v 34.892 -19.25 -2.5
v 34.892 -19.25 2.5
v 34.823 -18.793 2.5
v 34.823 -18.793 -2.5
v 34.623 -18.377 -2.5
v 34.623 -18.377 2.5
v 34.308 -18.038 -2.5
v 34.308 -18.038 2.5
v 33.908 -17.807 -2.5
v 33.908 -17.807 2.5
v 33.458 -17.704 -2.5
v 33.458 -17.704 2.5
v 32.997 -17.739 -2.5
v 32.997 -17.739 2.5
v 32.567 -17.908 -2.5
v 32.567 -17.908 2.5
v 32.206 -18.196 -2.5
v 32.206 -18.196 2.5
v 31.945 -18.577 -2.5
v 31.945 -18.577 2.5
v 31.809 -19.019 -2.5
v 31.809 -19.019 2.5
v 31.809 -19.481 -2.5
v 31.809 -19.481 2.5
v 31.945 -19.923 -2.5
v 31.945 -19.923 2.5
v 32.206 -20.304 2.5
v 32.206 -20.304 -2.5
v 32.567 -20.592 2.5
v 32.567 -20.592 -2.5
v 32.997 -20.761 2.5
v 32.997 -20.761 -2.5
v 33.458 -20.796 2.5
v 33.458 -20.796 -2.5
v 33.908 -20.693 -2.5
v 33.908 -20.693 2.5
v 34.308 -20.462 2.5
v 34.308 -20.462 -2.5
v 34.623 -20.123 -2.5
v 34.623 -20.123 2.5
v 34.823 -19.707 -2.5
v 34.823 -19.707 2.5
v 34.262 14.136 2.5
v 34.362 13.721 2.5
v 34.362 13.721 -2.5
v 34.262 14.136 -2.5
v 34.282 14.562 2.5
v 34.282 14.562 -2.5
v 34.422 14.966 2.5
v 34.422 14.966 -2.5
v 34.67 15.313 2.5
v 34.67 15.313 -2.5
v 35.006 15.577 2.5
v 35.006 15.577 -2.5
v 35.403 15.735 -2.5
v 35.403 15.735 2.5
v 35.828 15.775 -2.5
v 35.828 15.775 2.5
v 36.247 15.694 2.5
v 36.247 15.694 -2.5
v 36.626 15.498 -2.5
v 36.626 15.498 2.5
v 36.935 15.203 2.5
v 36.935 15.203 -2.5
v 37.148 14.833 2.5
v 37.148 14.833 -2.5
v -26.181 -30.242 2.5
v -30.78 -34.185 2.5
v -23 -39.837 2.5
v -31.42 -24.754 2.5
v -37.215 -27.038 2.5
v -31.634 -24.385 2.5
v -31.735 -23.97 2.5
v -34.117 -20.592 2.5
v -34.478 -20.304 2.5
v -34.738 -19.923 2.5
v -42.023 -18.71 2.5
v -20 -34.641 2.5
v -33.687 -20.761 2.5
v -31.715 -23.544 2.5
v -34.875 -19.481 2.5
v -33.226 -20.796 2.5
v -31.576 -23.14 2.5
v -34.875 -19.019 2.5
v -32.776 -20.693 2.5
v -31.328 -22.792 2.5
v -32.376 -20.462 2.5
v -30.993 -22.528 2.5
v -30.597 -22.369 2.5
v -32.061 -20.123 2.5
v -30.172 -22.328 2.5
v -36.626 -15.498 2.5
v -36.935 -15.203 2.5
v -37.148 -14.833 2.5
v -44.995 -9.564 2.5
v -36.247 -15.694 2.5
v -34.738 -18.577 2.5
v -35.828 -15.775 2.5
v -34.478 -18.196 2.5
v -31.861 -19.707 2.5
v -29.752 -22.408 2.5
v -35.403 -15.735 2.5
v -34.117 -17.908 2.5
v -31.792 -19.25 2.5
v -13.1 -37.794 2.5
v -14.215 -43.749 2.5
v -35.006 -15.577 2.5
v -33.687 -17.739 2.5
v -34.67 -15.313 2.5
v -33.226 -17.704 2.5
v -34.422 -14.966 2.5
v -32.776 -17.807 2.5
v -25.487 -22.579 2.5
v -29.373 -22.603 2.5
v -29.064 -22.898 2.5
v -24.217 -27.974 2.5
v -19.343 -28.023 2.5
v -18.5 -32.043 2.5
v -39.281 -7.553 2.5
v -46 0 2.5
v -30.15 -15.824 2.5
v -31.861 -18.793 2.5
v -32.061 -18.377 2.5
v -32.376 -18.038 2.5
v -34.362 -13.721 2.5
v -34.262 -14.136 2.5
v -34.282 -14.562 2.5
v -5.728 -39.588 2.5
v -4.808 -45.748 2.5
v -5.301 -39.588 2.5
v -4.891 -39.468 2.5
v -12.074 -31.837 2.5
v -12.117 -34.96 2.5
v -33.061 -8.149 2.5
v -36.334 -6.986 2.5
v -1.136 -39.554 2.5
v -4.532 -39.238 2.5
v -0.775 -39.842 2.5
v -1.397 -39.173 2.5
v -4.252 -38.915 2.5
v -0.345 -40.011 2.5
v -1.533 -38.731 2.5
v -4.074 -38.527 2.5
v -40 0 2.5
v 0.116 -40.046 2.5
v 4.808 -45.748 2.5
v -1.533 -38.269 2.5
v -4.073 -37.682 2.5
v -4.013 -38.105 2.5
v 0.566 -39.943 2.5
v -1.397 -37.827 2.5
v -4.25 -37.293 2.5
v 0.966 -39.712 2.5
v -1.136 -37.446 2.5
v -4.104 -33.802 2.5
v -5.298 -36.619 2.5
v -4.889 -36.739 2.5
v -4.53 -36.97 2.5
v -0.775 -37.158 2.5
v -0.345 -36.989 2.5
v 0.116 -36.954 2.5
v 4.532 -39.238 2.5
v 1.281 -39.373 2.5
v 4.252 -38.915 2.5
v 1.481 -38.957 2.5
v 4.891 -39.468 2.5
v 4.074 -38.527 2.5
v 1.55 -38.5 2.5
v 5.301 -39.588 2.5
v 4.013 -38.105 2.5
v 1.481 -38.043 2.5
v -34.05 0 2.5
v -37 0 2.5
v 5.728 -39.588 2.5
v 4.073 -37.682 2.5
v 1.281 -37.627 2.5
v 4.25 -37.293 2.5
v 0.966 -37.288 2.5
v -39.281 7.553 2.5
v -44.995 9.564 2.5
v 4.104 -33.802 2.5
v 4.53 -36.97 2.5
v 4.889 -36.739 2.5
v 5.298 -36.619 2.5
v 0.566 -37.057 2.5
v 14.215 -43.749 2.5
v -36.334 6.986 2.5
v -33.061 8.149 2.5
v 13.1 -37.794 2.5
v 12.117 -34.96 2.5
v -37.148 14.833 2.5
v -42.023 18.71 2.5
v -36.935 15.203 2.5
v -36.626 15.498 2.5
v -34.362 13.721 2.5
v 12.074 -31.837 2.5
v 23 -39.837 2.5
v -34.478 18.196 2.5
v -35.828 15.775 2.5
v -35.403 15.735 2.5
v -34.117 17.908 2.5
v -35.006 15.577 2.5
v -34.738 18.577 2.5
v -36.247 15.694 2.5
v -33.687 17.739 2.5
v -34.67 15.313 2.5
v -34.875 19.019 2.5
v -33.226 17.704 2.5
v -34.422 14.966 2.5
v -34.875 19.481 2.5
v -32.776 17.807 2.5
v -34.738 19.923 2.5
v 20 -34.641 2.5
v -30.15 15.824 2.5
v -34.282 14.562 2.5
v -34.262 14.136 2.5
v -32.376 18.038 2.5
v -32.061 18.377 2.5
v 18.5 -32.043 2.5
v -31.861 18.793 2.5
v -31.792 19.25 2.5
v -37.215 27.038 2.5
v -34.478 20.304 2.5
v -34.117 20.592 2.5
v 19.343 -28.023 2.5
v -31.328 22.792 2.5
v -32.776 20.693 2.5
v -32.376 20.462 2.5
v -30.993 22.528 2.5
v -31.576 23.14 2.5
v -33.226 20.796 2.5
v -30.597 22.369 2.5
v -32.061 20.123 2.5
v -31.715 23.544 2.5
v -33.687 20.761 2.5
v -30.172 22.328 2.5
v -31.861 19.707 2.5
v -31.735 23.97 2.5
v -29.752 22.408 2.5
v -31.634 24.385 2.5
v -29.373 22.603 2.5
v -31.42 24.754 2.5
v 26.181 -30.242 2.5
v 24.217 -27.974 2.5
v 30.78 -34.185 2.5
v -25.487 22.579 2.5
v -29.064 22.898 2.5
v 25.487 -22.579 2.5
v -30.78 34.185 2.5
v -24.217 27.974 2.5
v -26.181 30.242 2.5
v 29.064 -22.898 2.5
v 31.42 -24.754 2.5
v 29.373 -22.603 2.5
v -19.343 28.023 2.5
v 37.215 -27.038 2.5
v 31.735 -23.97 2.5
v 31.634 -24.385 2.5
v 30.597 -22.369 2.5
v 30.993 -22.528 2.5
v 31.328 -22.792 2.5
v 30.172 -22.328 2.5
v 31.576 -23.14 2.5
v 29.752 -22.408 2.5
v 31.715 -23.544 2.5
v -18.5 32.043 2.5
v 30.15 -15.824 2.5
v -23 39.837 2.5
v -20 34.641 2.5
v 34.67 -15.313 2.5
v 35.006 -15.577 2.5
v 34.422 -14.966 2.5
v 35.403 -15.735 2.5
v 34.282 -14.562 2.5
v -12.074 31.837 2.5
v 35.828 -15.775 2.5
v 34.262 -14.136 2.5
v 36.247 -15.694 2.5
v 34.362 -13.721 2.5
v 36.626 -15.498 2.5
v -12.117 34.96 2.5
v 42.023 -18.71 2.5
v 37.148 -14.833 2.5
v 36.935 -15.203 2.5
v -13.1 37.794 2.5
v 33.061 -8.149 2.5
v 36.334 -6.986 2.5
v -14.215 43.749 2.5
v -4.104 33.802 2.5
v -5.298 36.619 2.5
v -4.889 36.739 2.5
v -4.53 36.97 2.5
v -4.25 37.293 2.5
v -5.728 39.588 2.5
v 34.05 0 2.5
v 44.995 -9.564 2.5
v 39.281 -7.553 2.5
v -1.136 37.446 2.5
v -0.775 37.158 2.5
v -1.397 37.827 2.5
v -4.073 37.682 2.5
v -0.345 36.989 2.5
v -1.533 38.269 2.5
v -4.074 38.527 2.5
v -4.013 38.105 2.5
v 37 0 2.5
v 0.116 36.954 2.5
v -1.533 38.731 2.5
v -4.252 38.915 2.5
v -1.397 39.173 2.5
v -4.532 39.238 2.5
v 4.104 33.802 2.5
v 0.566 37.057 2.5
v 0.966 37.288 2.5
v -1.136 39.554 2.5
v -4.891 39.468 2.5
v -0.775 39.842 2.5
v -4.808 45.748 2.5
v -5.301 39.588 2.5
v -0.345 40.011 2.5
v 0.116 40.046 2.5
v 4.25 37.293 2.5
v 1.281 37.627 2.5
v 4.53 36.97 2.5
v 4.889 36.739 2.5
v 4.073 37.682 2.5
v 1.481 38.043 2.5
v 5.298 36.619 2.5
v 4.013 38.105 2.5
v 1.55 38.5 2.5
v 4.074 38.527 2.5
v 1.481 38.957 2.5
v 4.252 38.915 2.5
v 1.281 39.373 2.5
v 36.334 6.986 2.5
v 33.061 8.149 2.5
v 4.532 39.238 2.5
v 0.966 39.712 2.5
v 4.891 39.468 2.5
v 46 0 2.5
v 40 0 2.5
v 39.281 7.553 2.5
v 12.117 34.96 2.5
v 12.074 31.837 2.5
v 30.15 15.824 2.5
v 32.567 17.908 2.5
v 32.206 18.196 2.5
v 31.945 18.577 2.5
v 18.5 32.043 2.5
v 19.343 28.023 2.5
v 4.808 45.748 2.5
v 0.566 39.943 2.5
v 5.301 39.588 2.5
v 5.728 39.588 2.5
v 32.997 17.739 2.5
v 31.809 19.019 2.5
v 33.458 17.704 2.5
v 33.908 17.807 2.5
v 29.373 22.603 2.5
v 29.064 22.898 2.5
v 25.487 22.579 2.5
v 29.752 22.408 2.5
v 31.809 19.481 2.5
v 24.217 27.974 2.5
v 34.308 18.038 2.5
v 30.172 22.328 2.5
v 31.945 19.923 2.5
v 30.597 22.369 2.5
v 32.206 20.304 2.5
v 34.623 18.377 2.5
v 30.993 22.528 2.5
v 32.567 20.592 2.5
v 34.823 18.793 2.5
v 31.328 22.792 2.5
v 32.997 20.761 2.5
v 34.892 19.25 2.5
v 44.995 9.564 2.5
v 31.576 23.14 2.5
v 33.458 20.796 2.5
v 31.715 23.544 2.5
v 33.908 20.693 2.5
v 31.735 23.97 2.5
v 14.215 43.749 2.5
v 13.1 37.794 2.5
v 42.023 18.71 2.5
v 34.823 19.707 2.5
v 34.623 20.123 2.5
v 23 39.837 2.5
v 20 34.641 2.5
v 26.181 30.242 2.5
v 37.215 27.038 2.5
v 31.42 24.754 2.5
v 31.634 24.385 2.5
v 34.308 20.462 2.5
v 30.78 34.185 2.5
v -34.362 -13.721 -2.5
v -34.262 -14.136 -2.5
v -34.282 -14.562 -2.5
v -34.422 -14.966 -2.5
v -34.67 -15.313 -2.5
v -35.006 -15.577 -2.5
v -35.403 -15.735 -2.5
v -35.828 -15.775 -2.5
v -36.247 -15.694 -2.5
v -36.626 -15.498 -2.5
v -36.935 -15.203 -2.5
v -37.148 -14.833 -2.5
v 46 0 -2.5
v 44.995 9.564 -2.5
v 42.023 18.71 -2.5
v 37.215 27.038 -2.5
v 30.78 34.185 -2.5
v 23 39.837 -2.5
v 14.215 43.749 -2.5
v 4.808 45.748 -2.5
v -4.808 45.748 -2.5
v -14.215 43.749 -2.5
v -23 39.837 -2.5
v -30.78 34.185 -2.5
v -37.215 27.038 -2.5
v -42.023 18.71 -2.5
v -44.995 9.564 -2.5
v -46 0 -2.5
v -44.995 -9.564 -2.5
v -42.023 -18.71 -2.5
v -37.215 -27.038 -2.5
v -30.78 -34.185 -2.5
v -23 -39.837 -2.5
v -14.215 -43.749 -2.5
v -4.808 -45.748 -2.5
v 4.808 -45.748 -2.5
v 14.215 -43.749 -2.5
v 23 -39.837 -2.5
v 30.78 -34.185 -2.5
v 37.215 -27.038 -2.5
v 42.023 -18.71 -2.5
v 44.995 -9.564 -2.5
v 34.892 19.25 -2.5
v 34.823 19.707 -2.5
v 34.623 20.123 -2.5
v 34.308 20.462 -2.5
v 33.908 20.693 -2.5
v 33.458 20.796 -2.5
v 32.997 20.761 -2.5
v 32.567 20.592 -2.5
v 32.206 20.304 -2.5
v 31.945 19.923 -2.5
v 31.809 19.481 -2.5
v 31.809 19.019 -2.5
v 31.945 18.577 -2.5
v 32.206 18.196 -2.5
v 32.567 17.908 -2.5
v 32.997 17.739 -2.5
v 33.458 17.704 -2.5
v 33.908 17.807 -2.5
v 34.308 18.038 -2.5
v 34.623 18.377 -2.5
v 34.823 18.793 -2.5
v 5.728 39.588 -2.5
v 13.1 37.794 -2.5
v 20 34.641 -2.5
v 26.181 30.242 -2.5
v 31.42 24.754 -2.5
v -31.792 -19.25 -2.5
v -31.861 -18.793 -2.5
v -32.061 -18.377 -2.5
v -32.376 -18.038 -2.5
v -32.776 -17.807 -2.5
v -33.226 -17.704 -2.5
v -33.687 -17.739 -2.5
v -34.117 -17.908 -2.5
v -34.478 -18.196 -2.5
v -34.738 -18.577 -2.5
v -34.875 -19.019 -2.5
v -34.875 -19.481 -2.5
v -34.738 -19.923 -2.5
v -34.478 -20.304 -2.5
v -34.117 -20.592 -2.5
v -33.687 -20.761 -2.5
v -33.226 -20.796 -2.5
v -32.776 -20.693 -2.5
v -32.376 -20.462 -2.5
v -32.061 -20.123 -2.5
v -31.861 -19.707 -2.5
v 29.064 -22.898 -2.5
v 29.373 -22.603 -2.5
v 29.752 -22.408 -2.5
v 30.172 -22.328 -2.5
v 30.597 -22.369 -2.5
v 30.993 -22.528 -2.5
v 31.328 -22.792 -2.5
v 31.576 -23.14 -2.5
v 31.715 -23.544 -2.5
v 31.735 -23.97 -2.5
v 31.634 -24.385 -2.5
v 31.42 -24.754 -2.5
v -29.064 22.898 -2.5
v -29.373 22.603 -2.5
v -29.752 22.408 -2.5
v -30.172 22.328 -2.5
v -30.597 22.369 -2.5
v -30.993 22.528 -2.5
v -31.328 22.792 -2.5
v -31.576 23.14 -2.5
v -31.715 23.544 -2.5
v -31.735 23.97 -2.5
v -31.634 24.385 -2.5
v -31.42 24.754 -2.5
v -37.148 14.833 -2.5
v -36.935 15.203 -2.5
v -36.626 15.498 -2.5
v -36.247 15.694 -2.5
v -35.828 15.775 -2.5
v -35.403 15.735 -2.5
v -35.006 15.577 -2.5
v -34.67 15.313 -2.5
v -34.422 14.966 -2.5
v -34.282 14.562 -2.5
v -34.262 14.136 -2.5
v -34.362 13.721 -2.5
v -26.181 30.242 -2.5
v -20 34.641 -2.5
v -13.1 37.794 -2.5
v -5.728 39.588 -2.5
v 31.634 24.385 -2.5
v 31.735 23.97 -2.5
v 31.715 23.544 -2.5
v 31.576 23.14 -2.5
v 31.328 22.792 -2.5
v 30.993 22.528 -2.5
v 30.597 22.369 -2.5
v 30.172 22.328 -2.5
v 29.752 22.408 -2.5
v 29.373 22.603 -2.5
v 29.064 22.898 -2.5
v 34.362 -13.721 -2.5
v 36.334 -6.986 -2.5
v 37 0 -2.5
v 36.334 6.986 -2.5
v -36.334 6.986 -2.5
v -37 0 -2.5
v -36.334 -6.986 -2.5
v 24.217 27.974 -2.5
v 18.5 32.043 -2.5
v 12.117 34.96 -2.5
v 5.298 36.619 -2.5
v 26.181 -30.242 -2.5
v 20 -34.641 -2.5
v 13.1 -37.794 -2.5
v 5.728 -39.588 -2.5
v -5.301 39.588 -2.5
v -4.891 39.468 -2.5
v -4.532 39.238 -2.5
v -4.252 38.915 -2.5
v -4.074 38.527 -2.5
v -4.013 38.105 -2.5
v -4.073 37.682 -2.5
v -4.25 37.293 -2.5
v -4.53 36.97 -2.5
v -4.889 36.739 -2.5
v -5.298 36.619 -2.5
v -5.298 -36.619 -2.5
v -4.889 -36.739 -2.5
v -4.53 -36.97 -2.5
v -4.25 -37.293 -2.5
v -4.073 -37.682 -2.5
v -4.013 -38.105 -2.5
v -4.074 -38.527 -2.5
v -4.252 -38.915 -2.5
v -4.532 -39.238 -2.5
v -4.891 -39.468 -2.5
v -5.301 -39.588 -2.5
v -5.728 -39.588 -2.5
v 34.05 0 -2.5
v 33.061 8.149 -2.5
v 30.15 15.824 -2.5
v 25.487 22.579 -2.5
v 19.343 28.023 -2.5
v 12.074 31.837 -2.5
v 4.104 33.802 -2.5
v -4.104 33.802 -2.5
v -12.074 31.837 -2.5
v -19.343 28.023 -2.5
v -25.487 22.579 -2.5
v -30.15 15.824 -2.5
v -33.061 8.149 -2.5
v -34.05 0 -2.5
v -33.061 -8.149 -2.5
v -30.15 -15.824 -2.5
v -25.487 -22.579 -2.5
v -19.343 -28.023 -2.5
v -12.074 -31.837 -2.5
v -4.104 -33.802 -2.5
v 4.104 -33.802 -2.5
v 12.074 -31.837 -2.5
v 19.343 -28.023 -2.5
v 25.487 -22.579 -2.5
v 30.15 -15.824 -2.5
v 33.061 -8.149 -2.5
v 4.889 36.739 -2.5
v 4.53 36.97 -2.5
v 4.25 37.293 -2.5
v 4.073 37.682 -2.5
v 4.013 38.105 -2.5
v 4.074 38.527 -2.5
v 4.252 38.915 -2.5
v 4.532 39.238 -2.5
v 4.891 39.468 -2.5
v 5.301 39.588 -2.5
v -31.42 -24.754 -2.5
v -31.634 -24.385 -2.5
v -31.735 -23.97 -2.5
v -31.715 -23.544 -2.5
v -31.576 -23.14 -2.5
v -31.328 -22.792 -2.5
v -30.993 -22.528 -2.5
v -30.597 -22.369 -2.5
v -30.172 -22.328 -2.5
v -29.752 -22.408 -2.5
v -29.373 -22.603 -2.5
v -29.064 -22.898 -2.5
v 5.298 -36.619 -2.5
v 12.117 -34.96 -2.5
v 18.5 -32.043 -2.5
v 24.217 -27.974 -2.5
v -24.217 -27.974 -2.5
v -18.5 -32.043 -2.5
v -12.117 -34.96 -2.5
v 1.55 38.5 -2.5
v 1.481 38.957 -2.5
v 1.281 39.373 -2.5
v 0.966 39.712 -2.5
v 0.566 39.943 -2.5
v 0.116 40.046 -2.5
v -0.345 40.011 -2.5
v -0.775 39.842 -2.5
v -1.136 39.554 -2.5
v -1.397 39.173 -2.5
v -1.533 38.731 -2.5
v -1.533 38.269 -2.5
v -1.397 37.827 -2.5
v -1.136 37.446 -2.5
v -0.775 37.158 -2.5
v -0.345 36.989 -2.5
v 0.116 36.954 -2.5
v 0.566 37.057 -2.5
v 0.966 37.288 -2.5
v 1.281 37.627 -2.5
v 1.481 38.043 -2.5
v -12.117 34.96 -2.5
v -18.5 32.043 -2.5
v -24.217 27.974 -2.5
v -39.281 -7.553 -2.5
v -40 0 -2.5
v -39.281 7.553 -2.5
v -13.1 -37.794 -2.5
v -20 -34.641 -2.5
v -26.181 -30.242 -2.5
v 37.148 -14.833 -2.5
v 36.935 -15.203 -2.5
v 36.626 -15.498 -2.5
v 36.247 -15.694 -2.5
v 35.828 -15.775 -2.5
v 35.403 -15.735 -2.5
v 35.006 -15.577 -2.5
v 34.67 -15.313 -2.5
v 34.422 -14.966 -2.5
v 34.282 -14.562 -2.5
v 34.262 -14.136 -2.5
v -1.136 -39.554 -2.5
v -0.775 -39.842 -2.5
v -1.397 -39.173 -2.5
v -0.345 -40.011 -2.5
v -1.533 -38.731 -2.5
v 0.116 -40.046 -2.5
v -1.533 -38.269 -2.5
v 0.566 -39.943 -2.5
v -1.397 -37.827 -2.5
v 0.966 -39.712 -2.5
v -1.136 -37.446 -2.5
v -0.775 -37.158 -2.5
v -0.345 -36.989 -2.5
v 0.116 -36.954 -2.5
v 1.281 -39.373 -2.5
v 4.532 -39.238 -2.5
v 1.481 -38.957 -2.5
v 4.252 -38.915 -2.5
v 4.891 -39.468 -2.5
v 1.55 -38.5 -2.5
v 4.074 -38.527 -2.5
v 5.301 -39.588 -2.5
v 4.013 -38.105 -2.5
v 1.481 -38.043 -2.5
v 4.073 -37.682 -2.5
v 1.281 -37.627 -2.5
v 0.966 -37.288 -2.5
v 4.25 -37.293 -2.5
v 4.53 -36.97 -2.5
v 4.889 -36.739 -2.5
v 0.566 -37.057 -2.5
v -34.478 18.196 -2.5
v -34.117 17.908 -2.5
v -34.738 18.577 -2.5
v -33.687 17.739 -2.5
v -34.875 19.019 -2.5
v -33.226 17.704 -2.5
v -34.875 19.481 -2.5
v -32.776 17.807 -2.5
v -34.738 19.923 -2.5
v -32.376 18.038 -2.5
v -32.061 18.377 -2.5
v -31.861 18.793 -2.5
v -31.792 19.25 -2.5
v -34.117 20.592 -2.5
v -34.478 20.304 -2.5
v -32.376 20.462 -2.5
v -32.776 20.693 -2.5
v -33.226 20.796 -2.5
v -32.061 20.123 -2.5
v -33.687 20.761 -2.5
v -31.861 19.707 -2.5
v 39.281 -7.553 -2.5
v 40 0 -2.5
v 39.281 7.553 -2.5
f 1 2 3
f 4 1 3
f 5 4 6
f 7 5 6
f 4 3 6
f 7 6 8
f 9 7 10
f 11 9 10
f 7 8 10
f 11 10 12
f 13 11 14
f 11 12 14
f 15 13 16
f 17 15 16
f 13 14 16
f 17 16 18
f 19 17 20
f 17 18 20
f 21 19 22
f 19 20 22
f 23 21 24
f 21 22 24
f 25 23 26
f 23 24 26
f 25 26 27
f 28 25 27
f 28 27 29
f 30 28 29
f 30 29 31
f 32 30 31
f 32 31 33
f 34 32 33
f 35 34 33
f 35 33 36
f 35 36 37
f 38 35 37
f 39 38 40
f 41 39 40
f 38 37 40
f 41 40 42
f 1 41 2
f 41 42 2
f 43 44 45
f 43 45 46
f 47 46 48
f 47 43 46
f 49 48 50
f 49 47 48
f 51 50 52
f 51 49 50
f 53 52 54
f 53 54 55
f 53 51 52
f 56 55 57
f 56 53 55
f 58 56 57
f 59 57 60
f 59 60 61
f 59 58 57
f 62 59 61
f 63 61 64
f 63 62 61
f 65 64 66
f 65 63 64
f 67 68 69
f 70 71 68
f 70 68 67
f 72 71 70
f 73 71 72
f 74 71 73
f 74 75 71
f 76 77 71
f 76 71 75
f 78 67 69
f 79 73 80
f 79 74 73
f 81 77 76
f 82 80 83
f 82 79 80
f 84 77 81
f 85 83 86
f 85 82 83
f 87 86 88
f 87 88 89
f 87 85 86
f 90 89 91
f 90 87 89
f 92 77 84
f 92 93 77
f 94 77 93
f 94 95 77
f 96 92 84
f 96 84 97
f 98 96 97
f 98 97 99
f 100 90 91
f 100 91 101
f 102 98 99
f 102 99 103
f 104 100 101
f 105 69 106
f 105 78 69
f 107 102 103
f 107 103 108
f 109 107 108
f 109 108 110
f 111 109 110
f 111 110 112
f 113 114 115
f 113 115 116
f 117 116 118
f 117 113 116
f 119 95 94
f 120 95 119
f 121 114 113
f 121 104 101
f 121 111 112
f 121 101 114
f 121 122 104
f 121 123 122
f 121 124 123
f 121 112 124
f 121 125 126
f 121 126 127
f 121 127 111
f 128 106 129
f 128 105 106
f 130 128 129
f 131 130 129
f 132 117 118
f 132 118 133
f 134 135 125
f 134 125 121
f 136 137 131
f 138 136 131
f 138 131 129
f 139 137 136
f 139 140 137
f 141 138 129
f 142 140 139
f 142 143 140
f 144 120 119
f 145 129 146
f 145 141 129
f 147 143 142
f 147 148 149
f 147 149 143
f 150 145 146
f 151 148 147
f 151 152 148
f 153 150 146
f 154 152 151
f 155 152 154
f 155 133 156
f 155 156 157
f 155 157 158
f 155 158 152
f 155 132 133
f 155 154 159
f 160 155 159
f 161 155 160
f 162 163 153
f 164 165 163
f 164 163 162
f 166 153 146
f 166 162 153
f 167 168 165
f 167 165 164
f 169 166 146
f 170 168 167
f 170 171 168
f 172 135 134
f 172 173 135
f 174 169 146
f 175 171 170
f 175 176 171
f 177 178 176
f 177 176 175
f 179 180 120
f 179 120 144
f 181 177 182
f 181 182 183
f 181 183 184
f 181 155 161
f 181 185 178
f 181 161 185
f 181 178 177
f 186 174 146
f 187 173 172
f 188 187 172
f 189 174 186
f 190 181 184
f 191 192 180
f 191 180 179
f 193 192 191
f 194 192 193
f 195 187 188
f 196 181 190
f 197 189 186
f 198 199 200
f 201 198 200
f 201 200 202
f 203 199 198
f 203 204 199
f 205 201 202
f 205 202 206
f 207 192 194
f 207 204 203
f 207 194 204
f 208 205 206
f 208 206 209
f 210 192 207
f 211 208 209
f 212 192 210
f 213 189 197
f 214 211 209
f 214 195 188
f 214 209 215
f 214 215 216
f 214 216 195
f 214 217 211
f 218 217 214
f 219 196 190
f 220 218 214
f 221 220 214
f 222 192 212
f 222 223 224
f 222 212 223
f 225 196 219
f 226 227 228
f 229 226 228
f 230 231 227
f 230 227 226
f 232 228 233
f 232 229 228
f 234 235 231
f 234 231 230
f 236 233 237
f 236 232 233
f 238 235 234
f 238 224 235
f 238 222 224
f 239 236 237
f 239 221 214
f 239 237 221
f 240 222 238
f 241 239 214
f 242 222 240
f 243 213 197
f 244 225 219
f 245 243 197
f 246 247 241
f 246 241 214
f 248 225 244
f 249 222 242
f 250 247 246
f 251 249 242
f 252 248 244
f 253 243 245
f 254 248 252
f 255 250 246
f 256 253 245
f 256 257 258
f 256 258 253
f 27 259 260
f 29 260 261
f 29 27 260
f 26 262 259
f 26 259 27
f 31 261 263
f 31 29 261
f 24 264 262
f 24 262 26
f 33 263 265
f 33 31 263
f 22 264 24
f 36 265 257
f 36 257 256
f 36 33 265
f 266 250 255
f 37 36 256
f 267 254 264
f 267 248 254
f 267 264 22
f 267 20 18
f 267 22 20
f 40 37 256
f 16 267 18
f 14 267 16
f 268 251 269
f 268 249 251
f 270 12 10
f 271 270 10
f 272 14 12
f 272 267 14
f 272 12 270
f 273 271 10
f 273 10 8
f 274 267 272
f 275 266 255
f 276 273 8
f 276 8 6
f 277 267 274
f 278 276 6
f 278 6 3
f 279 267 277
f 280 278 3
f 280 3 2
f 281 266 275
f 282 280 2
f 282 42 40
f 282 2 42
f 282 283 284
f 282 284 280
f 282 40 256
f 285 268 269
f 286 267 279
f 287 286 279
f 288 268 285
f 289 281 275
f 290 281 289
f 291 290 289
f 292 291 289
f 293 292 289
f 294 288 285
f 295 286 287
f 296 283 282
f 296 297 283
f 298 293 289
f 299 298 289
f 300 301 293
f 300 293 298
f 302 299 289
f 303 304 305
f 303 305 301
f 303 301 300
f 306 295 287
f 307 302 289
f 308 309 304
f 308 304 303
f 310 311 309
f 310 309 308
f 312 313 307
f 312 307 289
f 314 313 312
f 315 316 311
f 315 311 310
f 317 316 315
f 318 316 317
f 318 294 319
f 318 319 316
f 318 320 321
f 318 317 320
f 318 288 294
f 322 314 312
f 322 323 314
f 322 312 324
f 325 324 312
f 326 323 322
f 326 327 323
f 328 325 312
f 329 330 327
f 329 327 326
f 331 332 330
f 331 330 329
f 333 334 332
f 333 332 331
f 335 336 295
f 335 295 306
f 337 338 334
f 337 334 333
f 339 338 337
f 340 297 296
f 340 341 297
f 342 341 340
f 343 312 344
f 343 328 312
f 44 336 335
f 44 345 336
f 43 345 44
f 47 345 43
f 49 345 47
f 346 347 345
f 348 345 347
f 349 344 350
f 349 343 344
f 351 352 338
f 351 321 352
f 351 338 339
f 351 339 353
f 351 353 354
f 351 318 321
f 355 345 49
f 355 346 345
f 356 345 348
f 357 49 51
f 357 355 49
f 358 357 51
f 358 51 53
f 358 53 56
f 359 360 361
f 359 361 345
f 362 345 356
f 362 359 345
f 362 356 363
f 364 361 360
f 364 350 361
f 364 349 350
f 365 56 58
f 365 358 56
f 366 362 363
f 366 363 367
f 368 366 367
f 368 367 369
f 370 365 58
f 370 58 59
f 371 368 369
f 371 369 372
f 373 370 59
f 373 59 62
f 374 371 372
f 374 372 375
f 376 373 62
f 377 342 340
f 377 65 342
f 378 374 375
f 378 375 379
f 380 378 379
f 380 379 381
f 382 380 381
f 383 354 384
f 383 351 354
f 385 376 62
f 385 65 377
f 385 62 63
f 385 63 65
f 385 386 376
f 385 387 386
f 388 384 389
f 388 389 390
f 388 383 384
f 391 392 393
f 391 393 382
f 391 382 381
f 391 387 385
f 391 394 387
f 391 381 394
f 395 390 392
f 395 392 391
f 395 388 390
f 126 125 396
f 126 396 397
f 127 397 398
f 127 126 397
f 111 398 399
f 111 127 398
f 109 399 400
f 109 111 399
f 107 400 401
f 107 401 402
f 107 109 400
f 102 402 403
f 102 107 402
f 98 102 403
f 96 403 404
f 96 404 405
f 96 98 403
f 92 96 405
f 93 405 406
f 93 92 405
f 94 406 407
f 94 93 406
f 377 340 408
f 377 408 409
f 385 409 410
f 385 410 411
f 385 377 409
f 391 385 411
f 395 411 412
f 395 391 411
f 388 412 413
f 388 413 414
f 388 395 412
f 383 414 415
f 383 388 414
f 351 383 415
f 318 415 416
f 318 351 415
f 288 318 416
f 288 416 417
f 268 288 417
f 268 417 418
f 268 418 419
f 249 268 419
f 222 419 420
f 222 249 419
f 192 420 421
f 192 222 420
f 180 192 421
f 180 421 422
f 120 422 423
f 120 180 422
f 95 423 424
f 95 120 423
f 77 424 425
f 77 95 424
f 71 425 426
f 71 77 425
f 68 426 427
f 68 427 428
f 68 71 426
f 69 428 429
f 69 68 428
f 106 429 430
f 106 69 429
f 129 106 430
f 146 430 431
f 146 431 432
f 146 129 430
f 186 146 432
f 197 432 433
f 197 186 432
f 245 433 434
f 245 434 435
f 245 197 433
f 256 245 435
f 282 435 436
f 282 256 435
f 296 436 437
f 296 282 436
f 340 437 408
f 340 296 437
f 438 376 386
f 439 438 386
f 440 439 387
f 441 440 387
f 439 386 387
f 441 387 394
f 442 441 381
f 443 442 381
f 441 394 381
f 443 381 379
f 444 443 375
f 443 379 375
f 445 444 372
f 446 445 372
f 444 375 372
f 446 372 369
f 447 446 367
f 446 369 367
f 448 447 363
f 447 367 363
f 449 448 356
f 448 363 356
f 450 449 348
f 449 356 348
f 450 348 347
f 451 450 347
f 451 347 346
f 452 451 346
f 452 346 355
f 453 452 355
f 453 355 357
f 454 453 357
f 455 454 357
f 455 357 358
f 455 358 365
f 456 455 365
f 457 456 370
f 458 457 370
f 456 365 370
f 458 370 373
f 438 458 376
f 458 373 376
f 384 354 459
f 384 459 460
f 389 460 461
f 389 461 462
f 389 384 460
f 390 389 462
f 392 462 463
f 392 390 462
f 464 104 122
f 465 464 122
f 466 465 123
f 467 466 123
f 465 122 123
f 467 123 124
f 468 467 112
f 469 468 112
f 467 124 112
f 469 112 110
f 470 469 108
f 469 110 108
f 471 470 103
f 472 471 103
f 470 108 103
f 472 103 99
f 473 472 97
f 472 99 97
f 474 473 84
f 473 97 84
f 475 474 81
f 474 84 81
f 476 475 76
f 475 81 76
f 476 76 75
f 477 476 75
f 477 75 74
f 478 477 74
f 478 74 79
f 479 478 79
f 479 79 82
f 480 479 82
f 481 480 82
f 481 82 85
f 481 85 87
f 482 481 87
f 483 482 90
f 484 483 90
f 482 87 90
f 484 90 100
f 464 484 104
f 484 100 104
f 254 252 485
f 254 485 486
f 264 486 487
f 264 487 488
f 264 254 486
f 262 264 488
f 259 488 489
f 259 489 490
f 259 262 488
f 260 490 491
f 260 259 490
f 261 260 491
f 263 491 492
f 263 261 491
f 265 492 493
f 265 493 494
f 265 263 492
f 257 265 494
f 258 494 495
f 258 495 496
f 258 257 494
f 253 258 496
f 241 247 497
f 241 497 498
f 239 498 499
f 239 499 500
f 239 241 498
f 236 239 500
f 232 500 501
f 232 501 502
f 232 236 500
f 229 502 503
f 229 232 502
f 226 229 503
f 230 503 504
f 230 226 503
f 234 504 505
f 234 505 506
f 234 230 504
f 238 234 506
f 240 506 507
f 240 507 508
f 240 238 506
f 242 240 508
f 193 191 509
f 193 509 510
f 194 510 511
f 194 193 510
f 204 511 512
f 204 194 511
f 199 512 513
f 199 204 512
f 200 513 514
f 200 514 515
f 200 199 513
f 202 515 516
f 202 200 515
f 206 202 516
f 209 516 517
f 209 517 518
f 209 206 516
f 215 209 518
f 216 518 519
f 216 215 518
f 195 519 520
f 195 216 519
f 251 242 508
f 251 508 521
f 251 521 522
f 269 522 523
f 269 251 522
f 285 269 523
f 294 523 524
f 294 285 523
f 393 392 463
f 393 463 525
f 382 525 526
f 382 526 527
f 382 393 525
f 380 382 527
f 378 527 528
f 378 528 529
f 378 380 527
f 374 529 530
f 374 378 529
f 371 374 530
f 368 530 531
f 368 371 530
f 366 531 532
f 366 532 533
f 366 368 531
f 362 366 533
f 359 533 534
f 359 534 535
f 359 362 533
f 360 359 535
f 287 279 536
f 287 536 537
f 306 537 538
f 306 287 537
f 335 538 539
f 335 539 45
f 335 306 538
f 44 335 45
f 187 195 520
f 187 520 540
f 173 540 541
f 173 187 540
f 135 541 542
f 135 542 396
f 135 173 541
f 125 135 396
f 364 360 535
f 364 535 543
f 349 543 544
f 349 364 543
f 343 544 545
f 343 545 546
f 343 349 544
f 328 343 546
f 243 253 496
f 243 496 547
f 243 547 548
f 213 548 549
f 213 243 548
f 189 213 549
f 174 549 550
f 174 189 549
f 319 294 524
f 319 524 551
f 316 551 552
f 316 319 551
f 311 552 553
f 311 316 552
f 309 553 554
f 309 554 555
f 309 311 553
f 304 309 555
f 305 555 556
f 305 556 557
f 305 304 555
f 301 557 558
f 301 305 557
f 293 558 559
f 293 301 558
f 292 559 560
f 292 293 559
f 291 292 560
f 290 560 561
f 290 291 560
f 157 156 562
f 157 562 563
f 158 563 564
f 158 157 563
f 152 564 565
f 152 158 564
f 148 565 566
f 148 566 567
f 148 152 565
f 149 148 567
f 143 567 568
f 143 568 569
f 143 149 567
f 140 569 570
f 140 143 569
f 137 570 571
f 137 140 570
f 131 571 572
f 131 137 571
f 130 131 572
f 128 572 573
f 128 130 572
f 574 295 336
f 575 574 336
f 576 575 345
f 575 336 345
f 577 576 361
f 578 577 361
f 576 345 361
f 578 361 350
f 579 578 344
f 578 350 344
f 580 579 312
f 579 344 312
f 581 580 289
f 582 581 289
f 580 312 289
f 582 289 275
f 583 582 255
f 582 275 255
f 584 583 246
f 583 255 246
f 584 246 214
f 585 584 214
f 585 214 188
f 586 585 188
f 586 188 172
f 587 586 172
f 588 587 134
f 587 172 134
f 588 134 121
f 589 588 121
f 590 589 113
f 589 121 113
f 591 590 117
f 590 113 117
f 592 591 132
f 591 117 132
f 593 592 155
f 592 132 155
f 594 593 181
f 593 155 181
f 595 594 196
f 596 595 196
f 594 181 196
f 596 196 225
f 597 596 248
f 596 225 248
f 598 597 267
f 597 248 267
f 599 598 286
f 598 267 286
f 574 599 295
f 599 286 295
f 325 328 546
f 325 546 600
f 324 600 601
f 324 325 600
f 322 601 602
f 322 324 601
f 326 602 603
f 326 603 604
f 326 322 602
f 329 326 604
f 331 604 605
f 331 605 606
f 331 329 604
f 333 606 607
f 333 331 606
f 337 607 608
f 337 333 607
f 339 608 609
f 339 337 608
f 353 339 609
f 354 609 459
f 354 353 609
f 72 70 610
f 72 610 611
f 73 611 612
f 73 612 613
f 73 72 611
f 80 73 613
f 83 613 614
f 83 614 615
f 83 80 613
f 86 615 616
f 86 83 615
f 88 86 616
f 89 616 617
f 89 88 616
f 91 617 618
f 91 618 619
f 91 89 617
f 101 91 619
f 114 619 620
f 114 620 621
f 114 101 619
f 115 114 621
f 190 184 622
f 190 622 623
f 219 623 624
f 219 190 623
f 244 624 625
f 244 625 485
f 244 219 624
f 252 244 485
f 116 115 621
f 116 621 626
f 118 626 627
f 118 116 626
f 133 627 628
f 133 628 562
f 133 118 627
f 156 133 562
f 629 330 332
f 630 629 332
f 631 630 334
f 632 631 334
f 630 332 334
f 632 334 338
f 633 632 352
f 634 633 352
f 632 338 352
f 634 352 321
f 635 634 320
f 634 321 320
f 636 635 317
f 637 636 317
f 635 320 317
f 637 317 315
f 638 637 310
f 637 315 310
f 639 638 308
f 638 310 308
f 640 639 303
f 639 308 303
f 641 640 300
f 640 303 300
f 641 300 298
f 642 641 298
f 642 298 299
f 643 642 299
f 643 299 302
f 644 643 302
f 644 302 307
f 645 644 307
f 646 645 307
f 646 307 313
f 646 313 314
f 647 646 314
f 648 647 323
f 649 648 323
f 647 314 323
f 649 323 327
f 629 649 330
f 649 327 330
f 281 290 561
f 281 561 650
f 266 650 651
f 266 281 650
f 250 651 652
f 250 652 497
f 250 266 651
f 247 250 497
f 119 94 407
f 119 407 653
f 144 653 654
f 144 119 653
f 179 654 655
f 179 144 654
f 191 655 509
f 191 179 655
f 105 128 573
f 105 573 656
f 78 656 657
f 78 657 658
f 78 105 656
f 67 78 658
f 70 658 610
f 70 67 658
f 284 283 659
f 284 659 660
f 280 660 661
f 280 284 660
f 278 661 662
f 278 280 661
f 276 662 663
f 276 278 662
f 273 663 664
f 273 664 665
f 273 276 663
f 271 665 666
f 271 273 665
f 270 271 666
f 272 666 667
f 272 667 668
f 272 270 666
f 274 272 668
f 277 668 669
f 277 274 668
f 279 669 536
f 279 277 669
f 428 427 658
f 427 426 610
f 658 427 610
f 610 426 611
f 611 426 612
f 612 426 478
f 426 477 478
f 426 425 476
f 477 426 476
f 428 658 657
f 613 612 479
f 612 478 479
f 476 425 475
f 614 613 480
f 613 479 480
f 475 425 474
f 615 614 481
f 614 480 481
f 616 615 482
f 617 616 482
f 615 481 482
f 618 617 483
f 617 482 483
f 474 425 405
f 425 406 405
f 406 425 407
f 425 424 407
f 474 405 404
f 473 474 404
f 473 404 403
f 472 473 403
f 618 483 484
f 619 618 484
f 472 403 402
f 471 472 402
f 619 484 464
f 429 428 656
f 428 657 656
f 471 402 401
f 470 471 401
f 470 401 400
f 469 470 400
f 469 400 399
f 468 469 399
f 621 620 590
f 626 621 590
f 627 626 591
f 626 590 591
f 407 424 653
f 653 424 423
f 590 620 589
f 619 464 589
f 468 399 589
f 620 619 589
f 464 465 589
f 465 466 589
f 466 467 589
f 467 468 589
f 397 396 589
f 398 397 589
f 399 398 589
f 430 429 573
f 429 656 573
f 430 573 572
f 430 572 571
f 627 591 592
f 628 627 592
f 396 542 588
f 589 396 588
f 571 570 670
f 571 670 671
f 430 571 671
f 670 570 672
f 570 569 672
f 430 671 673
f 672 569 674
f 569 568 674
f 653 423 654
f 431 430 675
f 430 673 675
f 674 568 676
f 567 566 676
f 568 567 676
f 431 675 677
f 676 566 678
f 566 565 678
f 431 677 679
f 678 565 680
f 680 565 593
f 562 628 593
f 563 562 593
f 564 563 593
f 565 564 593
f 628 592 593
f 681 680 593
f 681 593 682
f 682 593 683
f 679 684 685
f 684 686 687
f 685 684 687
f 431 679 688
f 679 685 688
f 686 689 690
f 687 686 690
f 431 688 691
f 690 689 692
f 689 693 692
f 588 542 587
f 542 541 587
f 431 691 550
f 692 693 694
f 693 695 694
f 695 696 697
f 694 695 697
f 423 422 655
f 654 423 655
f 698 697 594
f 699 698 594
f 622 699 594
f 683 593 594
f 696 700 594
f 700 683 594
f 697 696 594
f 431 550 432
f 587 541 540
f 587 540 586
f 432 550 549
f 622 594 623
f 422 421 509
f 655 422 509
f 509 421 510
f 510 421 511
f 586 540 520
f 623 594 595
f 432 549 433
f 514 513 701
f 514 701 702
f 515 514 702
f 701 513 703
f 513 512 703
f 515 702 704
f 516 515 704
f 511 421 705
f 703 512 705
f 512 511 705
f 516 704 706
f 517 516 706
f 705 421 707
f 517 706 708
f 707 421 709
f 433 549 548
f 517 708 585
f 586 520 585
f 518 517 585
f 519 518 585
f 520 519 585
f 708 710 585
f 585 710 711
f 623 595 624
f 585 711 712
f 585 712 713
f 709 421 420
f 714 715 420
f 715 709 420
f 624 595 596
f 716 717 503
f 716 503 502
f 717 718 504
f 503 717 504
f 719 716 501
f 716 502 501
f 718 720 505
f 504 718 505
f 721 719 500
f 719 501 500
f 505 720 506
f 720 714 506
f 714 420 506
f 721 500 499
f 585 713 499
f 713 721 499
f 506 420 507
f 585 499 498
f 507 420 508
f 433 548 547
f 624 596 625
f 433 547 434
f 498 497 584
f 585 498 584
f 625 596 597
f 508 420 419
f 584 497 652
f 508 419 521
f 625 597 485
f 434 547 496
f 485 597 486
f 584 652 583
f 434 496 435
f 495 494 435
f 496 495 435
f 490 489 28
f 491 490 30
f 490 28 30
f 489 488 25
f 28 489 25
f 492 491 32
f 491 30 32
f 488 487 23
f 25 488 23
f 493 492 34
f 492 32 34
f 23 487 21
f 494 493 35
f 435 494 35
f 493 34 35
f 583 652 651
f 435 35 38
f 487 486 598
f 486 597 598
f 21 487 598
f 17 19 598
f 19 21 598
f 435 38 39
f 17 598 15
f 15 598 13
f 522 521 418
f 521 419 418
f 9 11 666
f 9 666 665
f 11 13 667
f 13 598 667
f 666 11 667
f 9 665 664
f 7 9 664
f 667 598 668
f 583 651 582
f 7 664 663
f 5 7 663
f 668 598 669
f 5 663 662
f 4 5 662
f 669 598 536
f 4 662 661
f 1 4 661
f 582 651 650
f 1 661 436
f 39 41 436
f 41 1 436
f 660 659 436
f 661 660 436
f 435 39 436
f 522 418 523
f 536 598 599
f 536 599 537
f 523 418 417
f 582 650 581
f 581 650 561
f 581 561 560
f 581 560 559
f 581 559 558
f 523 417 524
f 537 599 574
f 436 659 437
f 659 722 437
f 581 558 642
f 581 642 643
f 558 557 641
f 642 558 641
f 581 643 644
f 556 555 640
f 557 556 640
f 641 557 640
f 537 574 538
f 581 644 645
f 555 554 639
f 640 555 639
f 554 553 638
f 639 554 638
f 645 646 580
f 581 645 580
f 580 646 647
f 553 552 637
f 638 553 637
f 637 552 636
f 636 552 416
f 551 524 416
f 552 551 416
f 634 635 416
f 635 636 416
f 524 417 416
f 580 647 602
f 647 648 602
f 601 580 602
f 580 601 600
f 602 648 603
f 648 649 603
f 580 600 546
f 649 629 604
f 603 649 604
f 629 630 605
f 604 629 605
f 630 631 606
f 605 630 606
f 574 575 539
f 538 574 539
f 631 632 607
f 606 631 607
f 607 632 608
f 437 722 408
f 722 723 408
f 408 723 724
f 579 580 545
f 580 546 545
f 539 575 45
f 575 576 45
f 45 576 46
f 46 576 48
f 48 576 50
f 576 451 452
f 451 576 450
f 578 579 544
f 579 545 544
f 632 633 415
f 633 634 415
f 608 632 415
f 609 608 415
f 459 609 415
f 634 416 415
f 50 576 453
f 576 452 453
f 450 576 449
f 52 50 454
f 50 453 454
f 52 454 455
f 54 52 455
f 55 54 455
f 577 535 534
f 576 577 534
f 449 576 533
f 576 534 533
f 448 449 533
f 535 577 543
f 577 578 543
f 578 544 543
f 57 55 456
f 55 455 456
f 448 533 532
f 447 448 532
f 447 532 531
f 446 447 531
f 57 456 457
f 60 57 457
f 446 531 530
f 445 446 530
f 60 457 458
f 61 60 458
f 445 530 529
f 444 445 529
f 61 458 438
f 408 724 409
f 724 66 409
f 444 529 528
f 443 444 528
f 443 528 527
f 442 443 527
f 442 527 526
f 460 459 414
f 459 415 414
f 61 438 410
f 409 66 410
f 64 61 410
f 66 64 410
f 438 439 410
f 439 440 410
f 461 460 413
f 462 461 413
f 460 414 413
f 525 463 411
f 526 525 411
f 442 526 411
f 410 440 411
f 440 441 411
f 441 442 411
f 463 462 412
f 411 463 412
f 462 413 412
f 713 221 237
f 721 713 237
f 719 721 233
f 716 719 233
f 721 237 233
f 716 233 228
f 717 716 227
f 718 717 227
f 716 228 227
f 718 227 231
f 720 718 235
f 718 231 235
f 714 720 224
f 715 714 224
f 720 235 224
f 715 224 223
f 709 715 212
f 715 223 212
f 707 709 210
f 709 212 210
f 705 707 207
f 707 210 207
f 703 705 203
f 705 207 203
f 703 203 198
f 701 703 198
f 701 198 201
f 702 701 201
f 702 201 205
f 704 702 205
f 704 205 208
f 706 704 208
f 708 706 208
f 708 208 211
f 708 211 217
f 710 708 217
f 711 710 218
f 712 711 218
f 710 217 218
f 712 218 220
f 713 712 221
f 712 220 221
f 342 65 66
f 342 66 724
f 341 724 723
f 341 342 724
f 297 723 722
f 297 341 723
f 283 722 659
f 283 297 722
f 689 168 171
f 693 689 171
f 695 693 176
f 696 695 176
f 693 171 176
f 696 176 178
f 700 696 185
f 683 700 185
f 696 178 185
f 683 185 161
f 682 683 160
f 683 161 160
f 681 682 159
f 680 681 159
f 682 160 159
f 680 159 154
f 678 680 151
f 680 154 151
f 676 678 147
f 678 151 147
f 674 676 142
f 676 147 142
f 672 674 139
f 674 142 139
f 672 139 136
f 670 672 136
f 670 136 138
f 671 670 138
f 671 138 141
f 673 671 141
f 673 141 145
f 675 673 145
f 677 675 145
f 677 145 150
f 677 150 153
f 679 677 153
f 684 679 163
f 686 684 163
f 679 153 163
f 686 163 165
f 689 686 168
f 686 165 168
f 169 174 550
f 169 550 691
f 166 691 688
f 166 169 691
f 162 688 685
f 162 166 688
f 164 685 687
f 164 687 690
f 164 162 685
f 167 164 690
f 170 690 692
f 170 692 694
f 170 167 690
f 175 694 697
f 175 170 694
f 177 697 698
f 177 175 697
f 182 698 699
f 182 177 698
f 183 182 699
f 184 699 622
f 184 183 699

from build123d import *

# Parameters (mm, degrees)
SKETCH_1_R      = 46
SKETCH_1_R_2    = 1.55
SKETCH_1_R_3    = 34.05
EXTRUDE_1_DEPTH = 5


with BuildPart() as part:
    # 草图1 → 凸台-拉伸1 (new body)
    with BuildSketch(Plane.XY.offset(2.5)):
        Circle(SKETCH_1_R)
        with Locations((33.341978046, 19.25)):
            Circle(SKETCH_1_R_2, mode=Mode.SUBTRACT)
        with Locations((33.341978046, -19.25)):
            Circle(SKETCH_1_R_2, mode=Mode.SUBTRACT)
        with Locations((0, -38.5)):
            Circle(SKETCH_1_R_2, mode=Mode.SUBTRACT)
        with Locations((-33.341978046, -19.25)):
            Circle(SKETCH_1_R_2, mode=Mode.SUBTRACT)
        with Locations((-33.341978046, 19.25)):
            Circle(SKETCH_1_R_2, mode=Mode.SUBTRACT)
        with Locations((0, 38.5)):
            Circle(SKETCH_1_R_2, mode=Mode.SUBTRACT)
        Circle(SKETCH_1_R_3, mode=Mode.SUBTRACT)
        with BuildLine():
            ThreePointArc((-5.298278059, 36.618687164), (-18.5, 32.04293994), (-29.063574308, 22.897786978))
            ThreePointArc((-29.063574308, 22.897786978), (-31.170115981, 22.647822626), (-31.420080332, 24.7543643))
            ThreePointArc((-31.420080332, 24.7543643), (-20, 34.641016151), (-5.727868172, 39.587769907))
            ThreePointArc((-5.727868172, 39.587769907), (-4.028531744, 38.318023592), (-5.298278059, 36.618687164))
        make_face(mode=Mode.SUBTRACT)
        with BuildLine():
            ThreePointArc((29.063574308, 22.897786978), (18.5, 32.04293994), (5.298278059, 36.618687164))
            ThreePointArc((5.298278059, 36.618687164), (4.028531744, 38.318023592), (5.727868172, 39.587769907))
            ThreePointArc((5.727868172, 39.587769907), (20, 34.641016151), (31.420080332, 24.7543643))
            ThreePointArc((31.420080332, 24.7543643), (31.170115981, 22.647822626), (29.063574308, 22.897786978))
        make_face(mode=Mode.SUBTRACT)
        with BuildLine():
            ThreePointArc((34.361852367, -13.720900186), (37, 0), (34.361852367, 13.720900186))
            ThreePointArc((34.361852367, 13.720900186), (35.198647725, 15.670200965), (37.147948505, 14.833405607))
            ThreePointArc((37.147948505, 14.833405607), (40, 0), (37.147948505, -14.833405607))
            ThreePointArc((37.147948505, -14.833405607), (35.198647725, -15.670200965), (34.361852367, -13.720900186))
        make_face(mode=Mode.SUBTRACT)
        with BuildLine():
            ThreePointArc((5.298278059, -36.618687164), (18.5, -32.04293994), (29.063574308, -22.897786978))
            ThreePointArc((29.063574308, -22.897786978), (31.170115981, -22.647822626), (31.420080332, -24.7543643))
            ThreePointArc((31.420080332, -24.7543643), (20, -34.641016151), (5.727868172, -39.587769907))
            ThreePointArc((5.727868172, -39.587769907), (4.028531744, -38.318023592), (5.298278059, -36.618687164))
        make_face(mode=Mode.SUBTRACT)
        with BuildLine():
            ThreePointArc((-29.063574308, -22.897786978), (-18.5, -32.04293994), (-5.298278059, -36.618687164))
            ThreePointArc((-5.298278059, -36.618687164), (-4.028531744, -38.318023592), (-5.727868172, -39.587769907))
            ThreePointArc((-5.727868172, -39.587769907), (-20, -34.641016151), (-31.420080332, -24.7543643))
            ThreePointArc((-31.420080332, -24.7543643), (-31.170115981, -22.647822626), (-29.063574308, -22.897786978))
        make_face(mode=Mode.SUBTRACT)
        with BuildLine():
            ThreePointArc((-34.361852367, 13.720900186), (-37, 0), (-34.361852367, -13.720900186))
            ThreePointArc((-34.361852367, -13.720900186), (-35.198647725, -15.670200965), (-37.147948505, -14.833405607))
            ThreePointArc((-37.147948505, -14.833405607), (-40, 0), (-37.147948505, 14.833405607))
            ThreePointArc((-37.147948505, 14.833405607), (-35.198647725, 15.670200965), (-34.361852367, 13.720900186))
        make_face(mode=Mode.SUBTRACT)
    extrude(amount=-EXTRUDE_1_DEPTH)


solid = part.part
